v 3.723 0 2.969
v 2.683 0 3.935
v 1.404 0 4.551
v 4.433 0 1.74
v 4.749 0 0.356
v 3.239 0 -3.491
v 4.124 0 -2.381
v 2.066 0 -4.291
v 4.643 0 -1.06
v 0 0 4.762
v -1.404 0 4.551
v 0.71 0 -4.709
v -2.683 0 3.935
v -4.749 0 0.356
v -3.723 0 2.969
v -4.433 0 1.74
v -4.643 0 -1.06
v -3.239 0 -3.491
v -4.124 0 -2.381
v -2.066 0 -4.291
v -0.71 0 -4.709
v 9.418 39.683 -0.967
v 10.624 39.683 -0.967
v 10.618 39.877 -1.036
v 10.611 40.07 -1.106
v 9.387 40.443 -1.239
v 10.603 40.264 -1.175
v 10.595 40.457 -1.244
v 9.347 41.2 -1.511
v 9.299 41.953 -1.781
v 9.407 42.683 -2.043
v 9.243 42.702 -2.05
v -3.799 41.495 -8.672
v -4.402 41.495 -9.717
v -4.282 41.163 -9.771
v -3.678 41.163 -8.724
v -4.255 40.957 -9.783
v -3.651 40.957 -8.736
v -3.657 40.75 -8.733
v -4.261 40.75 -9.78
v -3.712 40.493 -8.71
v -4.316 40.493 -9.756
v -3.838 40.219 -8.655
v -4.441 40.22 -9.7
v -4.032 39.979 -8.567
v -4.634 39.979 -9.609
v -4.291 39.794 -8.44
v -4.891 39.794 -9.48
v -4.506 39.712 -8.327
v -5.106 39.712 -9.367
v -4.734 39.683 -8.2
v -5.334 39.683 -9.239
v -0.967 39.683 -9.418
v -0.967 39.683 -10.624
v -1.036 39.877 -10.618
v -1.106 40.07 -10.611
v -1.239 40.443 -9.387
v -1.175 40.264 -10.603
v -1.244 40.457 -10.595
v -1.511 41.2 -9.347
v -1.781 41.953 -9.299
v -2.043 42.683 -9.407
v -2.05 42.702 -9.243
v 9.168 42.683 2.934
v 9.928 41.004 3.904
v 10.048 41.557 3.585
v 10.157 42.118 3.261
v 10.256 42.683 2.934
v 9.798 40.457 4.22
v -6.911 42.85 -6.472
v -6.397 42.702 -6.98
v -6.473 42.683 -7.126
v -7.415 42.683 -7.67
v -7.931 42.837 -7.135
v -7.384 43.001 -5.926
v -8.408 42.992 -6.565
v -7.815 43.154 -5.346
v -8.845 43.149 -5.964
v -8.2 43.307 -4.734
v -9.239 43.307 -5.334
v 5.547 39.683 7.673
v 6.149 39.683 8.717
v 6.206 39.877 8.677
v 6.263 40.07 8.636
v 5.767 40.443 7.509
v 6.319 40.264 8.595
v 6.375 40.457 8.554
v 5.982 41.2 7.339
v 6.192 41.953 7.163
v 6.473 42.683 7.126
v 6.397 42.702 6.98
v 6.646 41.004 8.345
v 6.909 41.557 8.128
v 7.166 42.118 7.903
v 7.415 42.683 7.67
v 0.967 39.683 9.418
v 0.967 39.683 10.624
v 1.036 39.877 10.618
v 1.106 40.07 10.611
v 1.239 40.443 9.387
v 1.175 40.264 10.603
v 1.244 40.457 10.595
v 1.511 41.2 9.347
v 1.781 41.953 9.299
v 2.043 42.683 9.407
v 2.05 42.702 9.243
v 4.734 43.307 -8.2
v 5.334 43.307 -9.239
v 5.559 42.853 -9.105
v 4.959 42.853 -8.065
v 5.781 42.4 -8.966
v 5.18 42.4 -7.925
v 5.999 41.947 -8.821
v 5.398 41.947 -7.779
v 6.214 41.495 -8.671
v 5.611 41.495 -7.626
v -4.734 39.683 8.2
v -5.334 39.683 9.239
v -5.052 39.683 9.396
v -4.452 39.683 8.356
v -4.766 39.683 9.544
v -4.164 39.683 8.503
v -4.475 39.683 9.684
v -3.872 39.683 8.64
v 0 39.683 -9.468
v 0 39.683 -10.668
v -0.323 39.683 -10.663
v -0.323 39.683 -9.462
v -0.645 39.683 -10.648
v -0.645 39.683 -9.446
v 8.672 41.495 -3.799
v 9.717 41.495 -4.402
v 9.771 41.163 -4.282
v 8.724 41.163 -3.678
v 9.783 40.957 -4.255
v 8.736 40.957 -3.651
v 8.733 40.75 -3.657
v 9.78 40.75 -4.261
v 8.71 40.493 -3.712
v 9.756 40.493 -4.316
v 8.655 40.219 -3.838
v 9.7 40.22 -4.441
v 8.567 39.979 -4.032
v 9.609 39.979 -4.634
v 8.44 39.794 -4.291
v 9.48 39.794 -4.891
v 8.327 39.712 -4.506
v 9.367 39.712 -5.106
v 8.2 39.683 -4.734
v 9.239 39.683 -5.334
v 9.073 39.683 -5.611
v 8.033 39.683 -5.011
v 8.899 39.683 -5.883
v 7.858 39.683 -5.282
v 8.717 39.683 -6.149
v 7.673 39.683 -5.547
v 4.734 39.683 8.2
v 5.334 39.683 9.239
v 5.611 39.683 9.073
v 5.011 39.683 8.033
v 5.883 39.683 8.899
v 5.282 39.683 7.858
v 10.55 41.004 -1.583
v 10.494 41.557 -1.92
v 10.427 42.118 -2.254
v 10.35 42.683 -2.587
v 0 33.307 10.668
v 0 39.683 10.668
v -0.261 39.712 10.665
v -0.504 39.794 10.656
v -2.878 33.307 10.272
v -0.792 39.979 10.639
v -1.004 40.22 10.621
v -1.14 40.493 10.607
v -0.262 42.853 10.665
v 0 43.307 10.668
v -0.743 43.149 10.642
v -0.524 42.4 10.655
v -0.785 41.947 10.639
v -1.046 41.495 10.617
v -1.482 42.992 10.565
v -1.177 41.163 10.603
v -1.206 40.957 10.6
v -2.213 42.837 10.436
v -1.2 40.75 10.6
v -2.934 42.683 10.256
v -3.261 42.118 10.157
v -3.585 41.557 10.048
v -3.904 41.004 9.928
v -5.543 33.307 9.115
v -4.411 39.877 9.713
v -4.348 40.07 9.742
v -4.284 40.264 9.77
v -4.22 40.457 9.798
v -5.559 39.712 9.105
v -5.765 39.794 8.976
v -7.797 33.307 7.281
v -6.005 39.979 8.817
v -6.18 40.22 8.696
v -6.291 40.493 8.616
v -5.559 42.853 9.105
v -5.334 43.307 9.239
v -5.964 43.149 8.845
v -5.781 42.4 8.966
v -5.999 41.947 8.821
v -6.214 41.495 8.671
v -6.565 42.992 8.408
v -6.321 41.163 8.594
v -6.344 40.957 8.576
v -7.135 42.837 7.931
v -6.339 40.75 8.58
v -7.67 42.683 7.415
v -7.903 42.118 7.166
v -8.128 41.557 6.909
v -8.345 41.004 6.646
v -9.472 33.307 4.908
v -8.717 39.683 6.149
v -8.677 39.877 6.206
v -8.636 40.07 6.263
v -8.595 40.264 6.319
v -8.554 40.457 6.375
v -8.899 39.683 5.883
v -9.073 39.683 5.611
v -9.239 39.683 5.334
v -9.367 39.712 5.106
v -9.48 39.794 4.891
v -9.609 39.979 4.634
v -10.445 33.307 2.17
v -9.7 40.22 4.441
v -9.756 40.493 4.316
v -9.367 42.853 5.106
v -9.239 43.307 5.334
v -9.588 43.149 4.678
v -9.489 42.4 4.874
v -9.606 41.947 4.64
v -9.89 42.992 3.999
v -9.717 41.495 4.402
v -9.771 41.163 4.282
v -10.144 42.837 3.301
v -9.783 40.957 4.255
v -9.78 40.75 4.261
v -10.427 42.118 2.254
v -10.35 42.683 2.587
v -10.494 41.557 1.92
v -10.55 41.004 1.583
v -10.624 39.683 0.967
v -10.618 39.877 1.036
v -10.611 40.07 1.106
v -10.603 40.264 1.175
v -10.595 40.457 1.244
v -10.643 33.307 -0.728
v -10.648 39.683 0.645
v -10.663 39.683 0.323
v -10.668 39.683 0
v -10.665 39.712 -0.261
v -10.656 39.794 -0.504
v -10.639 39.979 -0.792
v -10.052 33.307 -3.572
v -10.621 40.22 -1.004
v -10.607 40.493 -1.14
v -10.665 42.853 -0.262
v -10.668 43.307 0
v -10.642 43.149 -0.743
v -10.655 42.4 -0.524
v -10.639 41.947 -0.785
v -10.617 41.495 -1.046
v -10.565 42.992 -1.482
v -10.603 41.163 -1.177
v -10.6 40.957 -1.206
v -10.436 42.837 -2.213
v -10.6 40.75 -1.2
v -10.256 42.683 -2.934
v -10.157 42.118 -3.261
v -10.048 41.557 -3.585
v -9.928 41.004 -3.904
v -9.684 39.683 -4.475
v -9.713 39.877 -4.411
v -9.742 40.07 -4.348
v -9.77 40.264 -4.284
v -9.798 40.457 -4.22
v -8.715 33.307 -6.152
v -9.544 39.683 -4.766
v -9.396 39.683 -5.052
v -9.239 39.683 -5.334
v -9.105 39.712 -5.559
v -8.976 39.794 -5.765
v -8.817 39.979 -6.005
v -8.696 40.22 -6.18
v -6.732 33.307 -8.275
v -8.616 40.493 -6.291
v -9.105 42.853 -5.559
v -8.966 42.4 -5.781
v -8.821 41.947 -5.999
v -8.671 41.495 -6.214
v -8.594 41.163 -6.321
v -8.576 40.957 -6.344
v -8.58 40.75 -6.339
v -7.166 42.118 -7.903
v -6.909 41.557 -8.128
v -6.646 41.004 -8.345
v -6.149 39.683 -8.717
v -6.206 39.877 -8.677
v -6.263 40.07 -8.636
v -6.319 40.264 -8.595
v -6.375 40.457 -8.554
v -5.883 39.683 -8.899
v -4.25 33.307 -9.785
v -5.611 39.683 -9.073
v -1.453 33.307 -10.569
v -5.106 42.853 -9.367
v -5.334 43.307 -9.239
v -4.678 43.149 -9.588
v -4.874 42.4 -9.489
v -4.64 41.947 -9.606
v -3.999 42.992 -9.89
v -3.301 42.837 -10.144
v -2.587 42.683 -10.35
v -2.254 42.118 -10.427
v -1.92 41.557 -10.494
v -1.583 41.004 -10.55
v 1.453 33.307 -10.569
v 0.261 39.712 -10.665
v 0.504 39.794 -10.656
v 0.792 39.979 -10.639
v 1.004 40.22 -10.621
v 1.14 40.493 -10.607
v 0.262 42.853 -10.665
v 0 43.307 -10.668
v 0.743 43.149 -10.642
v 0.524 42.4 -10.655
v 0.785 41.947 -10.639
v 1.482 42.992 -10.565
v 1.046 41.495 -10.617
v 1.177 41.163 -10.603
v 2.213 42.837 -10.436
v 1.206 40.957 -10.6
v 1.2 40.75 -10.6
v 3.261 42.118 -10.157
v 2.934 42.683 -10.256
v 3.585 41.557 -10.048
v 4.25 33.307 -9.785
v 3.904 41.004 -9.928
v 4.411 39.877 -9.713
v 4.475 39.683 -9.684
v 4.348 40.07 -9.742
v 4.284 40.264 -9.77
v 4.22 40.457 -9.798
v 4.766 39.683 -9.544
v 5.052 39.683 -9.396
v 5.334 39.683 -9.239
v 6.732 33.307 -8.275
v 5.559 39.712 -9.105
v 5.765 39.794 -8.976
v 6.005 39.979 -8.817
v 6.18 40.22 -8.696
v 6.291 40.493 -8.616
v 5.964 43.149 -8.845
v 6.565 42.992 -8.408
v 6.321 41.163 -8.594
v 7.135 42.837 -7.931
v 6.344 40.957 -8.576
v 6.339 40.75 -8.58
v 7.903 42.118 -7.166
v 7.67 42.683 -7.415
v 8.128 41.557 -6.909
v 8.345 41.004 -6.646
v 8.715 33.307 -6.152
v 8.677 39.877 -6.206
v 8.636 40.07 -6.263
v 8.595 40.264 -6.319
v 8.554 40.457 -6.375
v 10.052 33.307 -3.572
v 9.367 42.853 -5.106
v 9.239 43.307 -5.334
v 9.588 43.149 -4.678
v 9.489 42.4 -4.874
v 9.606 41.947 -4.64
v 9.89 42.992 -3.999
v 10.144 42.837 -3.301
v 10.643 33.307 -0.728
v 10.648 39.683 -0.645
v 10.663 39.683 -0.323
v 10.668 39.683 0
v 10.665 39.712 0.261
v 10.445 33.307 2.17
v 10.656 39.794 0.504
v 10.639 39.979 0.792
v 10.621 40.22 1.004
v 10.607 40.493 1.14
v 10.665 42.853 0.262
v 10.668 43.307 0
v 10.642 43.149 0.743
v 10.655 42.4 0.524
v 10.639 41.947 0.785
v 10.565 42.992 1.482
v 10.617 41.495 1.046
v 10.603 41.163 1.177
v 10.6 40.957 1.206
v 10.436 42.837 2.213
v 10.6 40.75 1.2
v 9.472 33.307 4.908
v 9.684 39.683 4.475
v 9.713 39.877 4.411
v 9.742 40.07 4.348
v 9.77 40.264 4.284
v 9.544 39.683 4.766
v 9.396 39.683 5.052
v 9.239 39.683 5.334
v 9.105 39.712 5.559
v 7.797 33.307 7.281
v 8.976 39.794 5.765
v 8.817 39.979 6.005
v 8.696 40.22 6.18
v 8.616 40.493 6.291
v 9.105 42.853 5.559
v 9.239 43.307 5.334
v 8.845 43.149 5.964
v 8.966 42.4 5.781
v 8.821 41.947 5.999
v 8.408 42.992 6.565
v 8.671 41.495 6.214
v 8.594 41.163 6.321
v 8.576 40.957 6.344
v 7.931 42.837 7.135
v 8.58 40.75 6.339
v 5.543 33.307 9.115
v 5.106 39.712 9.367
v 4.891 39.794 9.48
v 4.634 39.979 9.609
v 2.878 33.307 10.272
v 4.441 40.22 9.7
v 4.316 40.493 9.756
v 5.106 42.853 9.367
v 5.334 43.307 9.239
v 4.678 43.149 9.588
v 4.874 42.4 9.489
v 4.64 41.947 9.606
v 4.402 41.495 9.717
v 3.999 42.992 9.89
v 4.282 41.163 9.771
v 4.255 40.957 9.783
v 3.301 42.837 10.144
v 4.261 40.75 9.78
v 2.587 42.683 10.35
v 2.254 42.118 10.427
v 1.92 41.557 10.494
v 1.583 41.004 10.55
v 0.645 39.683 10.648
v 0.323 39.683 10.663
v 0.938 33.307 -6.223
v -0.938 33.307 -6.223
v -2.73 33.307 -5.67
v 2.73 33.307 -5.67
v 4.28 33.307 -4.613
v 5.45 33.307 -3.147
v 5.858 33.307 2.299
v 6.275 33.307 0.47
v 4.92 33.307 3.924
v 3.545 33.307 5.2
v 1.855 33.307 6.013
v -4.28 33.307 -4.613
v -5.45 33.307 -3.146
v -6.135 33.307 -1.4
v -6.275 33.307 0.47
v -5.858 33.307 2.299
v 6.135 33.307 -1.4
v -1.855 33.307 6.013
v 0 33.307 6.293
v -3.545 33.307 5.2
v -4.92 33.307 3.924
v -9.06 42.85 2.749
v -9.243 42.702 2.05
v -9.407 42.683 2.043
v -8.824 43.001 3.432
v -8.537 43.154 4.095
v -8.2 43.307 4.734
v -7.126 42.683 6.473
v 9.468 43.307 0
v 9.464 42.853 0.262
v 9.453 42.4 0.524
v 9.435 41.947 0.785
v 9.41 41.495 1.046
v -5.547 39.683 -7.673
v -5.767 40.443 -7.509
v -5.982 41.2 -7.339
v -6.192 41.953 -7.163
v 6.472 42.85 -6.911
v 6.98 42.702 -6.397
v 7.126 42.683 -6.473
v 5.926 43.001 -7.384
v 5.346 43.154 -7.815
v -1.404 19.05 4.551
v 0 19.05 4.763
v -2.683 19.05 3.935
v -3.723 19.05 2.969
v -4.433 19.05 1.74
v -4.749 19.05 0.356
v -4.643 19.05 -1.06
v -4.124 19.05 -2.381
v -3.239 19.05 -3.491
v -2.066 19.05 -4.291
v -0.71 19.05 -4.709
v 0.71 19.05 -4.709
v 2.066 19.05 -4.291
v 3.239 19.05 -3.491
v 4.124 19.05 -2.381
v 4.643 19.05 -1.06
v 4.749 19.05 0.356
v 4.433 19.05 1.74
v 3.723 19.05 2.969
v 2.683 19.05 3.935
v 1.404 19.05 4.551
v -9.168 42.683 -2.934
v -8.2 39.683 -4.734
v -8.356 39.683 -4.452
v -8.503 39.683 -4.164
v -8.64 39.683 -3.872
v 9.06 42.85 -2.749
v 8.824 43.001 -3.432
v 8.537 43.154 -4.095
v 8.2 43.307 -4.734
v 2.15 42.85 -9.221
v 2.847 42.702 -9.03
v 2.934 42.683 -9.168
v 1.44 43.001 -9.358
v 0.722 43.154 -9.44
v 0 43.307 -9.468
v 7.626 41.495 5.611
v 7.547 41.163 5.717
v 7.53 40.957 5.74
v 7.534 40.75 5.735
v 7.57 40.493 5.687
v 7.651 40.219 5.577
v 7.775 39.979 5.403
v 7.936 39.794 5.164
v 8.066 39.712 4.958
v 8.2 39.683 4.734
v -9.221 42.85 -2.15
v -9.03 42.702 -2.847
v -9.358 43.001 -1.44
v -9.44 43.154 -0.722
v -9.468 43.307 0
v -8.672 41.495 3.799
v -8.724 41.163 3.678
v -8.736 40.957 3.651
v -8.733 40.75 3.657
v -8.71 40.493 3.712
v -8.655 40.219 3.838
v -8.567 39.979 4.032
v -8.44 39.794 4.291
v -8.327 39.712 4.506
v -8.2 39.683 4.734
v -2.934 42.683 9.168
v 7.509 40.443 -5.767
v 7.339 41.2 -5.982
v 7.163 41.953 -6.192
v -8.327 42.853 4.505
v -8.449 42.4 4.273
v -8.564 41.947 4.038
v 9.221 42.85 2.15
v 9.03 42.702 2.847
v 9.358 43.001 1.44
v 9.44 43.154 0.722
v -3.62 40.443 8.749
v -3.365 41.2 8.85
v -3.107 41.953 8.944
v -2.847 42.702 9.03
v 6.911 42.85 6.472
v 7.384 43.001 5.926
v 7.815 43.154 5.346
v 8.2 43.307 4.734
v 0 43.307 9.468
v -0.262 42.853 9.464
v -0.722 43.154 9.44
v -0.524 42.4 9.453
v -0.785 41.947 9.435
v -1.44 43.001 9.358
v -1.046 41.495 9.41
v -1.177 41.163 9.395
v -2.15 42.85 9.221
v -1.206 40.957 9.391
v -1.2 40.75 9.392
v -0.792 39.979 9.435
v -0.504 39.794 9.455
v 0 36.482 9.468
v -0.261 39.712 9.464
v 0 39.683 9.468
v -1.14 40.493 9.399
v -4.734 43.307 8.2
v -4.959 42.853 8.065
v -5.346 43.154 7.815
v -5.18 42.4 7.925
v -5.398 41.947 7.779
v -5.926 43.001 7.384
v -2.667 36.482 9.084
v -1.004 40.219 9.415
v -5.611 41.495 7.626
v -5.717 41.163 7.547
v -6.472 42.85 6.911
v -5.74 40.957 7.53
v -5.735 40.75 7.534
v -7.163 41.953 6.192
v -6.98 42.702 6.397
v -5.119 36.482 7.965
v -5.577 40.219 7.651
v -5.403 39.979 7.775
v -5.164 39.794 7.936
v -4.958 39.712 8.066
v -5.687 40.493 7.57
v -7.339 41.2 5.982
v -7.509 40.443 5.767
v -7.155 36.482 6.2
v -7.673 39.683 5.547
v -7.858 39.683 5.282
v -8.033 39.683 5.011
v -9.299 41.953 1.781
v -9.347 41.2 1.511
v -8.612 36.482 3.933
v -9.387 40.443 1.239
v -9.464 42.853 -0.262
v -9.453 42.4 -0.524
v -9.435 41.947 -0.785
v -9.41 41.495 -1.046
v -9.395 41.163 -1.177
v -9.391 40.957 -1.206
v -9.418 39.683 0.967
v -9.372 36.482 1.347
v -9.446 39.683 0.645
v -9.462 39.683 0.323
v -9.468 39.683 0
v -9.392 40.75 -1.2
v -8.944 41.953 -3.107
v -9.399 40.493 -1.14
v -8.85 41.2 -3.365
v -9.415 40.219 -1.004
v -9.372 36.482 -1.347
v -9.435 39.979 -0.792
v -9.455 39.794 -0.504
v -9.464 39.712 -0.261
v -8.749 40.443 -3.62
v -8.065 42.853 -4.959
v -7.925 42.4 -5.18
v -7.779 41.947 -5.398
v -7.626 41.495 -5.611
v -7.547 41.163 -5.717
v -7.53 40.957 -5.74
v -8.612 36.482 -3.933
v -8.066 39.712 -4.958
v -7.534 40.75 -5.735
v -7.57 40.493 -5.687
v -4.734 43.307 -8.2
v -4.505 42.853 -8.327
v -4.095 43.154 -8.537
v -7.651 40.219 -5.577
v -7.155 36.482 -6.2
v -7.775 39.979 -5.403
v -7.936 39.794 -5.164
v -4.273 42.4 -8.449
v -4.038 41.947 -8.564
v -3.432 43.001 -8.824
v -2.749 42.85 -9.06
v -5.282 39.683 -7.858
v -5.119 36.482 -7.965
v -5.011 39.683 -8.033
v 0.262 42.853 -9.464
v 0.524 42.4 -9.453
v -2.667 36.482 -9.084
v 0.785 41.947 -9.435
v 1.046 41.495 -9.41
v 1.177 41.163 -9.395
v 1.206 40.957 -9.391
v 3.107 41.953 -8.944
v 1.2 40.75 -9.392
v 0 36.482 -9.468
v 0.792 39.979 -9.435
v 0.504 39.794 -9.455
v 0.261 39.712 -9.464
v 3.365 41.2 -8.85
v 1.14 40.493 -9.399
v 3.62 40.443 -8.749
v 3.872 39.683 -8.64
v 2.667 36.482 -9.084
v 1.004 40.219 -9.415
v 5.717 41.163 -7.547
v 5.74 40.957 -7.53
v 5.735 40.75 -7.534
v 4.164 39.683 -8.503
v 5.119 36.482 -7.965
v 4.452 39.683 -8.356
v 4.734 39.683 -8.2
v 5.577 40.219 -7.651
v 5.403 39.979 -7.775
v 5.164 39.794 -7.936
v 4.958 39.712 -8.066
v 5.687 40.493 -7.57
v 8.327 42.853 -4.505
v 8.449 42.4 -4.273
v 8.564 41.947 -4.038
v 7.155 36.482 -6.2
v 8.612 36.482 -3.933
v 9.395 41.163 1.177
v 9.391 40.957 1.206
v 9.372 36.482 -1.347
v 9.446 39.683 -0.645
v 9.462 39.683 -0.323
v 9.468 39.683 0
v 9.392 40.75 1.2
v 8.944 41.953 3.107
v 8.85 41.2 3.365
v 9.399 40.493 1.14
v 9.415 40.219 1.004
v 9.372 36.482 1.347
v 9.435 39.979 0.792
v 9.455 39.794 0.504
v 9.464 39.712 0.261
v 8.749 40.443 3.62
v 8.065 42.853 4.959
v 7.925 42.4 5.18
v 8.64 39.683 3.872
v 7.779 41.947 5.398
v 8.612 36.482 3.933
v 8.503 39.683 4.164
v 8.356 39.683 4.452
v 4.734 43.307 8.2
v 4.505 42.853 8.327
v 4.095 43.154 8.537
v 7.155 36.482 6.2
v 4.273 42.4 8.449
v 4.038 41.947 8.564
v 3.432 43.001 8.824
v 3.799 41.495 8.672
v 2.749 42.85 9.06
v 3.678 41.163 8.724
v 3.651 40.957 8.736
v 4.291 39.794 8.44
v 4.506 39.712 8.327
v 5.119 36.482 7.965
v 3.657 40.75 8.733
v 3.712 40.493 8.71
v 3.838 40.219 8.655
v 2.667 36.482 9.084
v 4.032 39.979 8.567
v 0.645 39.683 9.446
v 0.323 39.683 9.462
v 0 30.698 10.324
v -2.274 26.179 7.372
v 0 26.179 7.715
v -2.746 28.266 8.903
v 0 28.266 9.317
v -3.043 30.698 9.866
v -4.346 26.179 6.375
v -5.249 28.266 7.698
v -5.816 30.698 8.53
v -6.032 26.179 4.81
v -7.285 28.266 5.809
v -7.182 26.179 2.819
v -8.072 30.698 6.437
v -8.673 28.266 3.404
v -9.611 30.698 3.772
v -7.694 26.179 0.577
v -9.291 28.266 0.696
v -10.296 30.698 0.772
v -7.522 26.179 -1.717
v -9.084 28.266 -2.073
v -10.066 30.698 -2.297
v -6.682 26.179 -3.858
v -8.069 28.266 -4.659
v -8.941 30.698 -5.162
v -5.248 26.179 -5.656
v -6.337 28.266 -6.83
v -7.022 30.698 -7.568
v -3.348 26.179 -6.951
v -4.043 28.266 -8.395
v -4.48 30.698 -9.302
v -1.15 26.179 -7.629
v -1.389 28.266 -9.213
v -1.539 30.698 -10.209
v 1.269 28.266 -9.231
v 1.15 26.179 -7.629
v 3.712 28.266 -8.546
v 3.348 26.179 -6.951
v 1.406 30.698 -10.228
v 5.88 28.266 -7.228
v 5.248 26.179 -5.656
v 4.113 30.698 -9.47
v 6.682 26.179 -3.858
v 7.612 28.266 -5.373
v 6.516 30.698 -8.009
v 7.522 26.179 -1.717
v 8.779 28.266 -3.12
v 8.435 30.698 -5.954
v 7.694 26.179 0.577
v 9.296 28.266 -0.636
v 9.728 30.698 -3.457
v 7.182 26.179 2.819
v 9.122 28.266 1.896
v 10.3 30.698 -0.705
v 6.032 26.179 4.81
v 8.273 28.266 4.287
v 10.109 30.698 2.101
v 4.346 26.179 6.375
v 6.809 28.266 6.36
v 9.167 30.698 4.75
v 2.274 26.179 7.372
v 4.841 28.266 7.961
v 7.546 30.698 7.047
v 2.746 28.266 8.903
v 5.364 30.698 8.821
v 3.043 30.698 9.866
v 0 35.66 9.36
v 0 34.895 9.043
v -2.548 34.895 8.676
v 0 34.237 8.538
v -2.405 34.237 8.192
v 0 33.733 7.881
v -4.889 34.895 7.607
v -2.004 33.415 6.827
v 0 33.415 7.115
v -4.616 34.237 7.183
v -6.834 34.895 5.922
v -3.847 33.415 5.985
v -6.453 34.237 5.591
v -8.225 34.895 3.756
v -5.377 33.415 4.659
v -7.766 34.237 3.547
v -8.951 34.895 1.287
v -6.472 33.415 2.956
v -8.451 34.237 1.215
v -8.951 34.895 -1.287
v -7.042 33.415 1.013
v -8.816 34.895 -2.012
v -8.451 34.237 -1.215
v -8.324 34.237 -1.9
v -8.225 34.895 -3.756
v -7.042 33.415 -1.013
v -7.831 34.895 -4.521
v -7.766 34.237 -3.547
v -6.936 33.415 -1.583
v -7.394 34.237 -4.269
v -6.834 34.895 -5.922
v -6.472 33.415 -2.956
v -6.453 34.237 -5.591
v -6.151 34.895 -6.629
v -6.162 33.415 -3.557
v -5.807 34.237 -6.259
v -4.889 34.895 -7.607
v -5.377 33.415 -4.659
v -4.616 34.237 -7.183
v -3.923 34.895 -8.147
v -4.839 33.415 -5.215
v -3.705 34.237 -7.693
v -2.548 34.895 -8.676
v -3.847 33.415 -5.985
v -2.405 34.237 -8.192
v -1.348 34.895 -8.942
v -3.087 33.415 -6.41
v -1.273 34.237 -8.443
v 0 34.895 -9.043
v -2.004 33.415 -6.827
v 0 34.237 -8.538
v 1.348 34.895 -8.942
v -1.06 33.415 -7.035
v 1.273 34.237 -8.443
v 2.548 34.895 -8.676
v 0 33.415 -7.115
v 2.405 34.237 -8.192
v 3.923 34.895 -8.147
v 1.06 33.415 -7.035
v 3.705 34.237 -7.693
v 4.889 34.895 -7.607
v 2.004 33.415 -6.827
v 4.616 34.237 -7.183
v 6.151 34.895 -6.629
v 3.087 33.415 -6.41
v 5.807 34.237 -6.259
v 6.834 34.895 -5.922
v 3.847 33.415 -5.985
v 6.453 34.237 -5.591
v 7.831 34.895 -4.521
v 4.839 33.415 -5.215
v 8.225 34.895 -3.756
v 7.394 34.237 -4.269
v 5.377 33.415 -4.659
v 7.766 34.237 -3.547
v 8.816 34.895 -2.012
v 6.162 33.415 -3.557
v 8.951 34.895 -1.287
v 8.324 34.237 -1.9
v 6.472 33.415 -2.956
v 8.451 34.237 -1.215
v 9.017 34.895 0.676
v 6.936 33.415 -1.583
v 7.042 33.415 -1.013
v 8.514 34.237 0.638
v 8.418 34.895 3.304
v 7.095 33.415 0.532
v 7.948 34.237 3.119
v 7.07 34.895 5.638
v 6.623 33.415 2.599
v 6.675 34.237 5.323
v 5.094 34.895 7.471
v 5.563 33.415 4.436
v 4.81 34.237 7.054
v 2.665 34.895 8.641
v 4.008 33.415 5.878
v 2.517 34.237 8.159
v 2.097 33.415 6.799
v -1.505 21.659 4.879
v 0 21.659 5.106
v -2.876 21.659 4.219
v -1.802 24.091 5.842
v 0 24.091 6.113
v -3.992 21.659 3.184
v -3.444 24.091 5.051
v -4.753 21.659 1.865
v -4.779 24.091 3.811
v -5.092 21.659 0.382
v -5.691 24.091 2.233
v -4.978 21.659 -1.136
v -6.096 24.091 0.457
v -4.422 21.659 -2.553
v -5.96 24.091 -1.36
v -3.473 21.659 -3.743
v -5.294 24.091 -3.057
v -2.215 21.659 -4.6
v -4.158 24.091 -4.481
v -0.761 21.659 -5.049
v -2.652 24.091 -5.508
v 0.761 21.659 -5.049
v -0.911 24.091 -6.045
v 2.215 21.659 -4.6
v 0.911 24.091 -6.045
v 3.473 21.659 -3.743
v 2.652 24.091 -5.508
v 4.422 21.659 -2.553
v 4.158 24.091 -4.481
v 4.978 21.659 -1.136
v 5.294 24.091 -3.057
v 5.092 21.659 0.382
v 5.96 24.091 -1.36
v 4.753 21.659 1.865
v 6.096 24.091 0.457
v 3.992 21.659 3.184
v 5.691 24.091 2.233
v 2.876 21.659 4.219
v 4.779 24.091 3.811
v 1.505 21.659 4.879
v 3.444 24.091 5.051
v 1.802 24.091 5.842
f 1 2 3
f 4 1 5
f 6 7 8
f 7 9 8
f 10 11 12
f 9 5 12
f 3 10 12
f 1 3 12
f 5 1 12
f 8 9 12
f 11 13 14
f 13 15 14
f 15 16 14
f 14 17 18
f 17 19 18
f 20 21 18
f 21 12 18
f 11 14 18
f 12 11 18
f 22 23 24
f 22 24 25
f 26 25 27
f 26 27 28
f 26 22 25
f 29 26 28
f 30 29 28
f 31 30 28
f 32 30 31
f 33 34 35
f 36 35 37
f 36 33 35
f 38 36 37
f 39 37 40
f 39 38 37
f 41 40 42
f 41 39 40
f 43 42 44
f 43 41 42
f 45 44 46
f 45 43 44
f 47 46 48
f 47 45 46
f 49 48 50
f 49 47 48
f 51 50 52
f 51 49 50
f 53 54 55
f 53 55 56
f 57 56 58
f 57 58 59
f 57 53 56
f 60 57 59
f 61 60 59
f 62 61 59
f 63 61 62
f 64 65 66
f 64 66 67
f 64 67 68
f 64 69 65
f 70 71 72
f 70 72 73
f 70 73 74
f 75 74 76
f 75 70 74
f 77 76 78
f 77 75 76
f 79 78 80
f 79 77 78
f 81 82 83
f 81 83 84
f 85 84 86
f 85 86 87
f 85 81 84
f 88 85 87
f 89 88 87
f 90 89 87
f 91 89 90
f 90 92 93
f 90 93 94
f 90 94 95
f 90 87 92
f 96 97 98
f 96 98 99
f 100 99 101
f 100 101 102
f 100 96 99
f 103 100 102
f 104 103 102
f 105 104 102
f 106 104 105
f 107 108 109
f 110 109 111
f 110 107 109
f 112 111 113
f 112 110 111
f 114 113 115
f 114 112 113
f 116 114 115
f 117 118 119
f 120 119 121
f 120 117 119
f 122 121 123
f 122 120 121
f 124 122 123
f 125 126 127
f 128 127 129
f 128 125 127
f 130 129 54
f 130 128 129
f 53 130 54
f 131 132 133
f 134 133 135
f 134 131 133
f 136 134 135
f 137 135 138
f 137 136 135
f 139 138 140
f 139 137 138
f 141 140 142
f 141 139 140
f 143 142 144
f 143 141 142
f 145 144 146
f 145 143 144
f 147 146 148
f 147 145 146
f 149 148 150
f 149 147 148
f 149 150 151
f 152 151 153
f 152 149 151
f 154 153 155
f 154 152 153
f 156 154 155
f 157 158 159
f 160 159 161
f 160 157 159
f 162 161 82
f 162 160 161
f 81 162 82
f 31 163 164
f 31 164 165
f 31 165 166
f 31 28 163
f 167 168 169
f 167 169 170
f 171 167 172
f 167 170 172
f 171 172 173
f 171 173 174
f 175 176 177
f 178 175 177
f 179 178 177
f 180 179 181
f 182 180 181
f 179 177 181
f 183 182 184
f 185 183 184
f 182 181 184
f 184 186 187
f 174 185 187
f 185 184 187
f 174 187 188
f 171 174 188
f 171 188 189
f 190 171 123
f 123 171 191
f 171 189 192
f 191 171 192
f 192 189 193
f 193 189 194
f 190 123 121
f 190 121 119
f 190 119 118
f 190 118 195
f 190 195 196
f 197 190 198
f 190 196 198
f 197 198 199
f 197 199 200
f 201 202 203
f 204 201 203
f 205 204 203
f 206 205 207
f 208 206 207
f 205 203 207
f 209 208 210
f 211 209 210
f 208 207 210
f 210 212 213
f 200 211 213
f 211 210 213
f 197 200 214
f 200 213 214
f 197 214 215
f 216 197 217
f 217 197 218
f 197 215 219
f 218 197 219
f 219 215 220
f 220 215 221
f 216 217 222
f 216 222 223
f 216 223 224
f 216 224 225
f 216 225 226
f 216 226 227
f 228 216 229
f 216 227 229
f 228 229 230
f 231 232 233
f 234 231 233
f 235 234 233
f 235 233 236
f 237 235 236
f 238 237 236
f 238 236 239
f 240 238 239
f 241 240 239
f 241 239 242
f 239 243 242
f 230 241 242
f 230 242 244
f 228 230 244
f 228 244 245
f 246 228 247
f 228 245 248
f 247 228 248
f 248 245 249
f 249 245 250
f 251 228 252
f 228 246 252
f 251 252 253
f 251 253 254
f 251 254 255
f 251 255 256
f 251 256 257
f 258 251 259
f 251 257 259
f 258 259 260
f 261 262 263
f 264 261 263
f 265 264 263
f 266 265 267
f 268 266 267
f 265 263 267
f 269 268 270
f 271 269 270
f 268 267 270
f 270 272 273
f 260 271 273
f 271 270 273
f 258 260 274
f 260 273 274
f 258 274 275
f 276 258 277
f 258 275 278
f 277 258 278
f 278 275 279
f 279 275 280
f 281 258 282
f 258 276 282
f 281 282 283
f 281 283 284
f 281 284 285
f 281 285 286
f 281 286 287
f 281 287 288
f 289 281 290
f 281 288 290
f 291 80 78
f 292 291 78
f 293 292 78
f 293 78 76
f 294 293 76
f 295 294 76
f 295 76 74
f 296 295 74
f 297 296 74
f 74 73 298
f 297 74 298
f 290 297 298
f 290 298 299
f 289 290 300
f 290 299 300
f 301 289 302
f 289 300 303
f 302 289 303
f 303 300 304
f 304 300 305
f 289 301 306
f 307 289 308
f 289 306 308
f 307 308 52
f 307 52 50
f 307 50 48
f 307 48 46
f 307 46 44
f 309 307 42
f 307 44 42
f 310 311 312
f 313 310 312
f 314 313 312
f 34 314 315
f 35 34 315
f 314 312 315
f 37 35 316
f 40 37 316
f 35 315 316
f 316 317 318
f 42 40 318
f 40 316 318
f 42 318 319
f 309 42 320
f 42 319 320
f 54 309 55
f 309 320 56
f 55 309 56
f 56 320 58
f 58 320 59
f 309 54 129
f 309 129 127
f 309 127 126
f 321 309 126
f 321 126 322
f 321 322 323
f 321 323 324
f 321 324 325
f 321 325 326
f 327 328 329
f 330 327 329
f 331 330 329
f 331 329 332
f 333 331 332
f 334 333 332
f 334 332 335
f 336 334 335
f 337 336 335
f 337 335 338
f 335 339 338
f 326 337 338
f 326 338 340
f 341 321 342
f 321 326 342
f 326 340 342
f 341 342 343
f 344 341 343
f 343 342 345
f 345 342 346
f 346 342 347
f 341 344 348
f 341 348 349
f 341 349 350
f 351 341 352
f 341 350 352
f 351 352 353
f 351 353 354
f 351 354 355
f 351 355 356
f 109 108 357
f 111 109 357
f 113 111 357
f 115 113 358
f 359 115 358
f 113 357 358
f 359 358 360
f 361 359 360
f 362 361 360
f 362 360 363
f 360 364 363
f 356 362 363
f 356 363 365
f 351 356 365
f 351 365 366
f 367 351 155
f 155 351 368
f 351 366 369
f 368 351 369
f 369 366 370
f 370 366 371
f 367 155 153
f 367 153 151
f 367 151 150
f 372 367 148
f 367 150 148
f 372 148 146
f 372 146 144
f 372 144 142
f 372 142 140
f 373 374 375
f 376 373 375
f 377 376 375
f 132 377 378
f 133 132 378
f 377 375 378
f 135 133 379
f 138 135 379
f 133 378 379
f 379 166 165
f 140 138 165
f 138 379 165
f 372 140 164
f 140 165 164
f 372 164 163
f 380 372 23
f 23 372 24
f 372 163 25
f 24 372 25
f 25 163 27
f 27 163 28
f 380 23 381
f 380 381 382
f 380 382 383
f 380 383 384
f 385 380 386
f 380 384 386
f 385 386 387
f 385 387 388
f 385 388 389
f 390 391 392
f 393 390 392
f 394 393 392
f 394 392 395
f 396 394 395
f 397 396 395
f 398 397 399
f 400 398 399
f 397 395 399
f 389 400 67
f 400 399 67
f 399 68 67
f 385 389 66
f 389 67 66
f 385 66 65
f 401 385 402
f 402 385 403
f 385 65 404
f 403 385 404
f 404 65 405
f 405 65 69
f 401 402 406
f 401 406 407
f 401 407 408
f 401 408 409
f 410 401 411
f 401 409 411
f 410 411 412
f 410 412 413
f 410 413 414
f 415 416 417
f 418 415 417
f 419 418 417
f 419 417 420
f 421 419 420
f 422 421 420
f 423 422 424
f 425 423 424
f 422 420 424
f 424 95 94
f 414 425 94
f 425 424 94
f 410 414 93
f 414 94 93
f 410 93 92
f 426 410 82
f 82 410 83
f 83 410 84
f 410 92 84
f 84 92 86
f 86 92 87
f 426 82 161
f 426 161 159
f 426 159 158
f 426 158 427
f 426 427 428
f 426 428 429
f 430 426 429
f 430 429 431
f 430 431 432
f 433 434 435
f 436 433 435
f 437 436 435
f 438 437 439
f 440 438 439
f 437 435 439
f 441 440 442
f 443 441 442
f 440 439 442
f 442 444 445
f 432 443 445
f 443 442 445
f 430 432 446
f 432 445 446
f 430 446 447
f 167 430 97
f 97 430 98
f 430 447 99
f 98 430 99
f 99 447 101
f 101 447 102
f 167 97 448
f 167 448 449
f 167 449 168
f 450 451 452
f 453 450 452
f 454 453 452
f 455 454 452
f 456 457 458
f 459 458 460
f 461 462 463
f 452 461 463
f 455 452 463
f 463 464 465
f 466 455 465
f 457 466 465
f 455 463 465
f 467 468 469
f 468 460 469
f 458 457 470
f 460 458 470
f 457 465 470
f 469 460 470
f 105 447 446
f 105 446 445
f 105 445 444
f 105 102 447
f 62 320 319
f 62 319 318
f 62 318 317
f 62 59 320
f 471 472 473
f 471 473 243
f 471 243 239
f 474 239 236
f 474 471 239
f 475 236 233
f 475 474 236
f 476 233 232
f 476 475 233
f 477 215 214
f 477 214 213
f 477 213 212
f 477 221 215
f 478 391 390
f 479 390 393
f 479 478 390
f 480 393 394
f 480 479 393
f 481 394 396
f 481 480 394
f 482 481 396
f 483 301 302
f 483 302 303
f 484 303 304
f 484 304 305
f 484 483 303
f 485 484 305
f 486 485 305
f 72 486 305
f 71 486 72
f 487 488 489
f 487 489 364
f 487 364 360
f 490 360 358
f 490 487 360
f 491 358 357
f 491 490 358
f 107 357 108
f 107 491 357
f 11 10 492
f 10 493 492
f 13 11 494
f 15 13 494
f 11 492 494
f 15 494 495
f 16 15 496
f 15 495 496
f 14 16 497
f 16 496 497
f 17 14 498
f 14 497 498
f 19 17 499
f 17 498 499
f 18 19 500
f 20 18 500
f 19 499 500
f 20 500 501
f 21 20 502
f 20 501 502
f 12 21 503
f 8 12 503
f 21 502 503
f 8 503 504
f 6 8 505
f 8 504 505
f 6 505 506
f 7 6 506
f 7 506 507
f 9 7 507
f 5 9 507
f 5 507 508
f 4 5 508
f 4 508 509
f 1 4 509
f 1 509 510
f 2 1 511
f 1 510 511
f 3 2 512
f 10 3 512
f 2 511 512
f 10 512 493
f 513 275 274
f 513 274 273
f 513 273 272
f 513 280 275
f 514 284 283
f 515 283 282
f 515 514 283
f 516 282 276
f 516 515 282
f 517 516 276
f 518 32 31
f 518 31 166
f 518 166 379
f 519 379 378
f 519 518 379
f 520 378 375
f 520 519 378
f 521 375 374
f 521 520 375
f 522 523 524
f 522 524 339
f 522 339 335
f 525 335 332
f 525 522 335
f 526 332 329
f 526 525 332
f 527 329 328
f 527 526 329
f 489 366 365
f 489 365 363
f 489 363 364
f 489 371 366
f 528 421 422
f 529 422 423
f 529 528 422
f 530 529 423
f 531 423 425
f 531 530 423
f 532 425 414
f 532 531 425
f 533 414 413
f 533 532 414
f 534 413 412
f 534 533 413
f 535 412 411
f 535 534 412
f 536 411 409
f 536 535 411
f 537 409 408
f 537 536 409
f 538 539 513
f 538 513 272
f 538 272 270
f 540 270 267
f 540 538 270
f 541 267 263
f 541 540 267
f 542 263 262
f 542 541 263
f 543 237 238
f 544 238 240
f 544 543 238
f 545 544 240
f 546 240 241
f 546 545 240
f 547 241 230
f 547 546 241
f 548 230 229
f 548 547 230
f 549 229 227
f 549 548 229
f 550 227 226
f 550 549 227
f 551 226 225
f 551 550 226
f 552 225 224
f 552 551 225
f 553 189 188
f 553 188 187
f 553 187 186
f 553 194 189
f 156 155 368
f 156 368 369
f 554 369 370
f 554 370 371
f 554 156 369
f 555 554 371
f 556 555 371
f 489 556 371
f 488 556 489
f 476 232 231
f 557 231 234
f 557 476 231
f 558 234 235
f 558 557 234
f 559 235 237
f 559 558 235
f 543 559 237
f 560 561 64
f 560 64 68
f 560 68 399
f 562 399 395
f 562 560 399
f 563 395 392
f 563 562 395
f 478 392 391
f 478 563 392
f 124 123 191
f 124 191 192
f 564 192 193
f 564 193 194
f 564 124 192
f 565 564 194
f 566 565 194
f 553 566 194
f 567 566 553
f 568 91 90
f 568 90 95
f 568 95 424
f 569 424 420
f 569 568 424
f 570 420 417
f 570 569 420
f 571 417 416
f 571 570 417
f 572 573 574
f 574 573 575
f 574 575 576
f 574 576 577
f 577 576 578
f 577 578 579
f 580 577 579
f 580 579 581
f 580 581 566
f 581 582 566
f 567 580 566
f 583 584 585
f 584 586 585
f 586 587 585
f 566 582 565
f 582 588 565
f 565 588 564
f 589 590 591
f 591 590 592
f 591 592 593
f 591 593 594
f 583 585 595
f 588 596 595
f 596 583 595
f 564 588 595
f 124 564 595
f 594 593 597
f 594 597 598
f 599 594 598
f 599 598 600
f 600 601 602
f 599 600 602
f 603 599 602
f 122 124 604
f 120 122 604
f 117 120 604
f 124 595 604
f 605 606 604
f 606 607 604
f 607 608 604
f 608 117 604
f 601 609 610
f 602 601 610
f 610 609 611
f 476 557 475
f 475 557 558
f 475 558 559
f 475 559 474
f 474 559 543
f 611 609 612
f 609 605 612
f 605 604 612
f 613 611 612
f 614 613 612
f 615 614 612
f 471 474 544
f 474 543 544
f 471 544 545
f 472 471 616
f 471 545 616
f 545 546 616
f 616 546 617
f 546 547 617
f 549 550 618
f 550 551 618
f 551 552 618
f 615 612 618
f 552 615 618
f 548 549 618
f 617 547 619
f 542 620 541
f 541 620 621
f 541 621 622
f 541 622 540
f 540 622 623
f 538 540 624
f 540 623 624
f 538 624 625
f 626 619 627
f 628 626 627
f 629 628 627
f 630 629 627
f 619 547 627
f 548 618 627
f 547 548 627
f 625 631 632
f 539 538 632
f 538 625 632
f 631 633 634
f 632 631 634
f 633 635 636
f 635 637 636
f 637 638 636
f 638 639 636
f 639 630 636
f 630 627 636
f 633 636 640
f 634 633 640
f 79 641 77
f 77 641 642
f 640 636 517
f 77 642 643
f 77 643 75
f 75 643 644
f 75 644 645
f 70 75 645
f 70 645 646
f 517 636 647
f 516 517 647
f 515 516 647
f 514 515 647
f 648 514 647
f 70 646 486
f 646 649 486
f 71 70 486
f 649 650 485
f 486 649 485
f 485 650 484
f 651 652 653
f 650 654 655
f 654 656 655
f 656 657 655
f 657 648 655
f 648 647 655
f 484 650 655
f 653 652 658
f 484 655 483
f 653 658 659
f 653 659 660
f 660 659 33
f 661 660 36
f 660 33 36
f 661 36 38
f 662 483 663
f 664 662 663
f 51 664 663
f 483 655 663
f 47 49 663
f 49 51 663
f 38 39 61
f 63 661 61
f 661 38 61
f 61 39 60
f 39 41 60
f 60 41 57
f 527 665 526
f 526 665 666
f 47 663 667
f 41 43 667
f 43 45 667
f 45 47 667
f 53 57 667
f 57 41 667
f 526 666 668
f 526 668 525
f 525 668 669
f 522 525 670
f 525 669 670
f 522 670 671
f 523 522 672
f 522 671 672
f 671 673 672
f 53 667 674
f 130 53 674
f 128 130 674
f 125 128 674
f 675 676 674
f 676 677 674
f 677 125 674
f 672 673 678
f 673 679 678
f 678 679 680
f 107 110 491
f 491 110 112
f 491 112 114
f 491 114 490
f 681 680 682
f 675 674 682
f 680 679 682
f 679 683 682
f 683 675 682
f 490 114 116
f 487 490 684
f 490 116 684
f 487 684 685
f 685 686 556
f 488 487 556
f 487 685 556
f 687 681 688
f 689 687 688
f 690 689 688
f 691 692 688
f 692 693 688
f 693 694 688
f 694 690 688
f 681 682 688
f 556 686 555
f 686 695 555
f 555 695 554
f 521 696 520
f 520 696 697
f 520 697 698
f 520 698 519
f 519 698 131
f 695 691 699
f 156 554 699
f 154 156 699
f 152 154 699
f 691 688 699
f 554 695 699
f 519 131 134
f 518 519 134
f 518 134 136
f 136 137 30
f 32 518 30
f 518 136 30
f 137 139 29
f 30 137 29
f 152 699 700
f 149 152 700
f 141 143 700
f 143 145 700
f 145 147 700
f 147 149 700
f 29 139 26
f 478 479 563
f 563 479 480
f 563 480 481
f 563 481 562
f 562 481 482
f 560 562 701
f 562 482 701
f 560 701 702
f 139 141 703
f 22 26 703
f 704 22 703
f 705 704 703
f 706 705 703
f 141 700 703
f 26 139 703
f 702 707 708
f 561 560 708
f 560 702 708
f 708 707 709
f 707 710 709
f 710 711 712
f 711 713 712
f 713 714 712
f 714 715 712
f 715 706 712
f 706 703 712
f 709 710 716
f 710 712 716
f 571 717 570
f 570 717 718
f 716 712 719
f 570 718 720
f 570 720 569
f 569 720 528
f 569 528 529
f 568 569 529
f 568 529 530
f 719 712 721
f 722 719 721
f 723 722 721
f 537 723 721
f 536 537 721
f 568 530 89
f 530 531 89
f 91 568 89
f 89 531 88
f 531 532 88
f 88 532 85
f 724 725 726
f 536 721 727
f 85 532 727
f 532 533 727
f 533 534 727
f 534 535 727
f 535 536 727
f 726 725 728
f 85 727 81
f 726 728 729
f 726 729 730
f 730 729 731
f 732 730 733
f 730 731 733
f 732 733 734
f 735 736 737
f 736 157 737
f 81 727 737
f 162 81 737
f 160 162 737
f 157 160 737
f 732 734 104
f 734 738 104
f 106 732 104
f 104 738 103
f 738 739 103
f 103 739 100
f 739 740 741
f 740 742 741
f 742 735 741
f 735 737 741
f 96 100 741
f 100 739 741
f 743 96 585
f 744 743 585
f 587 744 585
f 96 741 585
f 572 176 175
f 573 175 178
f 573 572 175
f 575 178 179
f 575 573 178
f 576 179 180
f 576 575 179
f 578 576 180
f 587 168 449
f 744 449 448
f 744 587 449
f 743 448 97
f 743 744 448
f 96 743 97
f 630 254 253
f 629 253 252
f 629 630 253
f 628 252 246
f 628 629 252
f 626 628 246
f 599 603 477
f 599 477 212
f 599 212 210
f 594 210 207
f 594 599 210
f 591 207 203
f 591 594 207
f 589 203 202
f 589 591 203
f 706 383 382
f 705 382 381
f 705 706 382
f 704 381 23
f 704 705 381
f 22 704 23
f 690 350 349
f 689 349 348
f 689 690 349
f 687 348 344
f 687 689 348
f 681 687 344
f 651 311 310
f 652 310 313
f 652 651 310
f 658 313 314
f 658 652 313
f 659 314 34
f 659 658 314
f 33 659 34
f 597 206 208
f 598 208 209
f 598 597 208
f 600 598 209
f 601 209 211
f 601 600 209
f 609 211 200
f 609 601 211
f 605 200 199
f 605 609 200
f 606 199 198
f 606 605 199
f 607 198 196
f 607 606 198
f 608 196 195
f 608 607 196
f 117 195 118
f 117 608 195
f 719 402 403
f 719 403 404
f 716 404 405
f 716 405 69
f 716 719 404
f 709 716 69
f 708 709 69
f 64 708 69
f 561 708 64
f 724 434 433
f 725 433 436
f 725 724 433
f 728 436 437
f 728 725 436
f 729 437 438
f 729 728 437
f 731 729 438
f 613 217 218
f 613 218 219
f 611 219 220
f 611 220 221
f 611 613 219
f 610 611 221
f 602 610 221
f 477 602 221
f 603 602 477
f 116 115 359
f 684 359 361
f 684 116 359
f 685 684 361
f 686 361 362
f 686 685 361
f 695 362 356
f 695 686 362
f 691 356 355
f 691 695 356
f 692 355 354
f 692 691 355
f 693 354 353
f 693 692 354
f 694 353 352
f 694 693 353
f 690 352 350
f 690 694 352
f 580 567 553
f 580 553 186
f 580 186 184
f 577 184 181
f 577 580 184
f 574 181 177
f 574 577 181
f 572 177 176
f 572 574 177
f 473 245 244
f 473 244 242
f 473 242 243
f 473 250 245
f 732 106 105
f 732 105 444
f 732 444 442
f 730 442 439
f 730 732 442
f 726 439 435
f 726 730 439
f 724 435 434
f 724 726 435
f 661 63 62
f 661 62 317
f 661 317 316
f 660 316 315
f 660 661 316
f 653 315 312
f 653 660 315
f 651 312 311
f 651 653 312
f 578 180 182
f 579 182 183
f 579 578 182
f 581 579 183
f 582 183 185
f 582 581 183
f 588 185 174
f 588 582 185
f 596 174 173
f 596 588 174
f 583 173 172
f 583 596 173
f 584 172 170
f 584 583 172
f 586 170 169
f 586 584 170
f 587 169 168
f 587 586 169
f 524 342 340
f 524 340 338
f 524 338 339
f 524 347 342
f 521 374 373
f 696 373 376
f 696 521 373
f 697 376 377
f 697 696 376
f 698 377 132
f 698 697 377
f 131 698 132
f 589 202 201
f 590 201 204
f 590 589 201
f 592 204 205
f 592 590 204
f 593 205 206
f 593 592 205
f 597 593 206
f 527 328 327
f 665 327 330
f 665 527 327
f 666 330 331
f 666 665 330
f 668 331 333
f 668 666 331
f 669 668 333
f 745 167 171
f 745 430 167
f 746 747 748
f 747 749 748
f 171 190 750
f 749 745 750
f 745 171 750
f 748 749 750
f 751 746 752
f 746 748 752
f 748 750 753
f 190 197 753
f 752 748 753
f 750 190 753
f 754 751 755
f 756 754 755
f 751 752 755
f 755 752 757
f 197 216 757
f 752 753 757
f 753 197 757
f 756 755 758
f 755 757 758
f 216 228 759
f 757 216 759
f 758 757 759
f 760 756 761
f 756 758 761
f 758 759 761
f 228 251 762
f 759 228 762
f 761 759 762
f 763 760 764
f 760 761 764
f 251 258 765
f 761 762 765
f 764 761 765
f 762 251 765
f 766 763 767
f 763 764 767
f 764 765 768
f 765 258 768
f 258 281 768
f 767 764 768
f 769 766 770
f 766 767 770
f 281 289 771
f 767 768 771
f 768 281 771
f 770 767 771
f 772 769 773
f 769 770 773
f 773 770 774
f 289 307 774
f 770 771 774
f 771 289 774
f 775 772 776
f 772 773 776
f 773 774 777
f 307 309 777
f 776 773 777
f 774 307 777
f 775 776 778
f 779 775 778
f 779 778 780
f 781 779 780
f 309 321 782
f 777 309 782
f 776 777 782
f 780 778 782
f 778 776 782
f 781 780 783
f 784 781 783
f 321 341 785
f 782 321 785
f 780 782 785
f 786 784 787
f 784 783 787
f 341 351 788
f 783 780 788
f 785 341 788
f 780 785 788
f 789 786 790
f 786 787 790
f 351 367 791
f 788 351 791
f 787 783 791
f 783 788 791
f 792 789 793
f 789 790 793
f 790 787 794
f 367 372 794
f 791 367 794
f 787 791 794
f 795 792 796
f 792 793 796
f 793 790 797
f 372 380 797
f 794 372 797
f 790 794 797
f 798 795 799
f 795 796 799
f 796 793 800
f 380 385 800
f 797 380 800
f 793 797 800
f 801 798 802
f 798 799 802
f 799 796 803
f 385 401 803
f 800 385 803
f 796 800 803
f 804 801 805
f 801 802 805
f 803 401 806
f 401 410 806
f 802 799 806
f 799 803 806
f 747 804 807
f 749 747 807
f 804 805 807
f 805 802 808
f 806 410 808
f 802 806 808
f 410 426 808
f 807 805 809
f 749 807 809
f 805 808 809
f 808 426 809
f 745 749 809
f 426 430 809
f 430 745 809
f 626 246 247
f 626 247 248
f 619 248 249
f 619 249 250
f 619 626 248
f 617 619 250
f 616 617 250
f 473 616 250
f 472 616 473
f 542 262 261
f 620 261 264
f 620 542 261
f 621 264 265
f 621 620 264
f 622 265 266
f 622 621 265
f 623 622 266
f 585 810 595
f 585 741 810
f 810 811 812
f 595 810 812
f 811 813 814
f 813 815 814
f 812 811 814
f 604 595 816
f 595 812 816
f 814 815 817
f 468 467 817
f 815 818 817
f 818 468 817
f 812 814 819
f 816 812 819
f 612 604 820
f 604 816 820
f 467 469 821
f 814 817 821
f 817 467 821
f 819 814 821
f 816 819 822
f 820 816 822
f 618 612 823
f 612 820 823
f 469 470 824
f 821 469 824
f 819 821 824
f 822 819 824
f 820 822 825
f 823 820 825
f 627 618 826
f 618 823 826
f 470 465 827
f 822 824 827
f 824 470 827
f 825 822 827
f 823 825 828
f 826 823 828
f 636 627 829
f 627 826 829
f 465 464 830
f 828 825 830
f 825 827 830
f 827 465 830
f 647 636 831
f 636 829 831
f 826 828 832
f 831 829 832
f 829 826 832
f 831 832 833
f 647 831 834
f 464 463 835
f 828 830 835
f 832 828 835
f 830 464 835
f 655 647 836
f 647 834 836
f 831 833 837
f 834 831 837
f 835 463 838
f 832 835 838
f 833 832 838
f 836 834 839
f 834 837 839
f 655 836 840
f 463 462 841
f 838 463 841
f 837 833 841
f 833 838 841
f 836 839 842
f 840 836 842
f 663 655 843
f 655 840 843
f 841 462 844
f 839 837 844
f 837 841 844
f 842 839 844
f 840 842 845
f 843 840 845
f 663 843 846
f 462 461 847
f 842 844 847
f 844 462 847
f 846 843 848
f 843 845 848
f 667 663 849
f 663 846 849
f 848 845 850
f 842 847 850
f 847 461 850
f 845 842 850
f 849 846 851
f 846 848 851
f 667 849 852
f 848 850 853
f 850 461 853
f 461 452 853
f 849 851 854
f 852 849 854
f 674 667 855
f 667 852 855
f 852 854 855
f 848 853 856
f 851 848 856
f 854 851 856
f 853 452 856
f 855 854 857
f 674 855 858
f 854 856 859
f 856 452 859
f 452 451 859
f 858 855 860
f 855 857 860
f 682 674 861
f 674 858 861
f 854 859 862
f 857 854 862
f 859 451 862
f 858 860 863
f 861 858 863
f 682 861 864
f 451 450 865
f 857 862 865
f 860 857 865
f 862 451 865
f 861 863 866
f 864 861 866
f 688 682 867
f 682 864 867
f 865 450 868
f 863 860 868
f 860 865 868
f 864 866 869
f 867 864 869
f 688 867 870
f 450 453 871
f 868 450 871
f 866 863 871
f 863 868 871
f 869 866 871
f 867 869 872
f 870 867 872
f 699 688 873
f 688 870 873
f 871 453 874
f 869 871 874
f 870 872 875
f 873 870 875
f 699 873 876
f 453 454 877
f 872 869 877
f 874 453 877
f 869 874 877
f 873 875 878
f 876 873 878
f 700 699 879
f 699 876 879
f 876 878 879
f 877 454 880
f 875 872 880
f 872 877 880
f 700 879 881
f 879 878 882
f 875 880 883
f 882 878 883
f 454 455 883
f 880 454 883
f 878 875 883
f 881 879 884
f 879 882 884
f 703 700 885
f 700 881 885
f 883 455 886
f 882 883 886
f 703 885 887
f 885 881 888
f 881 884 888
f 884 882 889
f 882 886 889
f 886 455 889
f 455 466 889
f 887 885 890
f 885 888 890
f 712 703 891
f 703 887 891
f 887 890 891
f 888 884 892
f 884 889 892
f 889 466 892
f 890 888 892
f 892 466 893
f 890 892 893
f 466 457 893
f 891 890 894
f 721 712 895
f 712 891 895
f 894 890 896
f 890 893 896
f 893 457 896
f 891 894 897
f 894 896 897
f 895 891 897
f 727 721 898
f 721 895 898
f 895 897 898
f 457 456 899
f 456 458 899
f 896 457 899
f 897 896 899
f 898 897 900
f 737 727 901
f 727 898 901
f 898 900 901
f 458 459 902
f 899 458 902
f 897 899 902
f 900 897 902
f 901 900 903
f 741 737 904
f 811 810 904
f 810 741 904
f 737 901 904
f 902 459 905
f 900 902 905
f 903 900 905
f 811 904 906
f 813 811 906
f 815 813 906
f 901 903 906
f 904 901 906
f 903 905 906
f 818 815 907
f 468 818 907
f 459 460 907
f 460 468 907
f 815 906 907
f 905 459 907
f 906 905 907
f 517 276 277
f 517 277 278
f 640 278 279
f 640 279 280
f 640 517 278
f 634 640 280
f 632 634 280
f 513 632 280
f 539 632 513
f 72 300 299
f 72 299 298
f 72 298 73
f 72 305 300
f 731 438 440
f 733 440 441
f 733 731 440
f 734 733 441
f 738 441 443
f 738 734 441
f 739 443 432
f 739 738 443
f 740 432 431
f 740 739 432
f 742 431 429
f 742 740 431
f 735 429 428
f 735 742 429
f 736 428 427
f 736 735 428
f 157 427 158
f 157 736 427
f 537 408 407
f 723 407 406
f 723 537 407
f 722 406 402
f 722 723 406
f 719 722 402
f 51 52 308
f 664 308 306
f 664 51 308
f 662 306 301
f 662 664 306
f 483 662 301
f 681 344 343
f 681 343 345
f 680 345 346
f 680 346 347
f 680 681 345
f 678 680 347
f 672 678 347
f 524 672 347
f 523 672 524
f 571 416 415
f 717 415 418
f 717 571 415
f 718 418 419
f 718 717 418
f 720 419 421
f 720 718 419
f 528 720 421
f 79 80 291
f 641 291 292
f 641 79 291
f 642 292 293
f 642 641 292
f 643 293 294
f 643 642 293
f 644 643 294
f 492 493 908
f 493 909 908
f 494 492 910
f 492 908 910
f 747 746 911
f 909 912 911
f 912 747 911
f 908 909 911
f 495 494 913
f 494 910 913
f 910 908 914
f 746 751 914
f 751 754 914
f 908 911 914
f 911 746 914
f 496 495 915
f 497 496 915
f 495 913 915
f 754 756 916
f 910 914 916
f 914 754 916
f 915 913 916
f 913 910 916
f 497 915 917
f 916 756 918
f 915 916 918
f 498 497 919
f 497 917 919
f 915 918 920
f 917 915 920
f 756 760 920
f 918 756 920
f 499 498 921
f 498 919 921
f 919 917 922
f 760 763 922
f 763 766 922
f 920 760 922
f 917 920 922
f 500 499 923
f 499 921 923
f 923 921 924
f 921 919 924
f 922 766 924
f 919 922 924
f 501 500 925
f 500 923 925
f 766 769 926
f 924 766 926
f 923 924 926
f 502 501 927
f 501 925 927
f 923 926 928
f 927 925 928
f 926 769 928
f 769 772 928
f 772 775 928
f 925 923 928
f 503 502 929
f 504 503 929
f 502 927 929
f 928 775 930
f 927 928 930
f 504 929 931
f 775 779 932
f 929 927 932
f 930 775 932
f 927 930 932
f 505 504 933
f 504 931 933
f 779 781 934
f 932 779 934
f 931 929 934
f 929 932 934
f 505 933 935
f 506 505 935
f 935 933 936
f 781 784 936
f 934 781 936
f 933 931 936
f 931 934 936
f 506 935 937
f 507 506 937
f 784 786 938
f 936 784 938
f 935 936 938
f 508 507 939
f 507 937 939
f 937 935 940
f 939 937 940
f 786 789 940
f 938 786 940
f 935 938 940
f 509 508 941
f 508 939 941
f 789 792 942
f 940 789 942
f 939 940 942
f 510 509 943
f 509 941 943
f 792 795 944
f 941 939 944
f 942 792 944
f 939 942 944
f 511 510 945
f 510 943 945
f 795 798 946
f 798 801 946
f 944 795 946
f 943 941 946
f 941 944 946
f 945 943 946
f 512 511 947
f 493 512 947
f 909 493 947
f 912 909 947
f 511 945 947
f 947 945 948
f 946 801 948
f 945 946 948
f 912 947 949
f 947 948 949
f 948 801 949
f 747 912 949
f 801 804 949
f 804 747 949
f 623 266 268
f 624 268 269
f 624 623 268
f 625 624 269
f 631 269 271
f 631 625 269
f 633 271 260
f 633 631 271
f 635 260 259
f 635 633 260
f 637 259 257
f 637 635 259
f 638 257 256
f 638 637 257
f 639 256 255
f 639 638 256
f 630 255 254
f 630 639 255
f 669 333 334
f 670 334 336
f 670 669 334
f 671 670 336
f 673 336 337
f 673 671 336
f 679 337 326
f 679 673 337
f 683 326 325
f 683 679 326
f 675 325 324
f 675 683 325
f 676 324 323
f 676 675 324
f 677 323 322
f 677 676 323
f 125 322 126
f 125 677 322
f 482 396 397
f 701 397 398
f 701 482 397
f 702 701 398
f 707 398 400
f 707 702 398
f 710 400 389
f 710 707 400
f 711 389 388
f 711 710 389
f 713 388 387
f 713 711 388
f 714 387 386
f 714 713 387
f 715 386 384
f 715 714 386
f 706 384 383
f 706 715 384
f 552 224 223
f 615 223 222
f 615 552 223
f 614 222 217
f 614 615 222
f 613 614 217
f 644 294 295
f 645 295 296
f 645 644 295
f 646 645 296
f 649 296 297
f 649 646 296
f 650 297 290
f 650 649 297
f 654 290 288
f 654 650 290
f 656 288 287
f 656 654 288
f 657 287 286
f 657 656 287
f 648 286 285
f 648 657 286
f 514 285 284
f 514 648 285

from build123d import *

# Parameters (mm, degrees)
CUT_EXTRUDE1_DEPTH = 19.304
CIRPATTERN2_COUNT  = 12


with BuildPart() as part:
    # Sketch1 → Revolve1 (revolve)
    with BuildSketch(Plane.XY):
        with BuildLine():
            Line((0, 0), (-4.7625, 0))
            Line((-4.7625, 0), (-4.7625, 19.05))
            ThreePointArc((-4.7625, 19.05), (-5.529894723, 22.907953795), (-7.71525, 26.178569096))
            ThreePointArc((-7.71525, 26.178569096), (-9.900605277, 29.449184398), (-10.668, 33.307138193))
            Line((-10.668, 33.307138193), (-10.668, 43.307138193))
            Line((-10.668, 43.307138193), (-9.468, 43.307138193))
            Line((-9.468, 43.307138193), (-9.468, 36.482138193))
            ThreePointArc((-9.468, 36.482138193), (-8.53806403, 34.237074162), (-6.293, 33.307138193))
            Line((-6.293, 33.307138193), (0, 33.307138193))
            Line((0, 33.307138193), (0, 0))
        make_face()
    revolve(axis=Axis((0, 33.307138193, 0), (0, -1, 0)))

    # Sketch2 → Cut-Extrude1 (cut)
    with BuildSketch(Plane.XY):
        with BuildLine():
            Line((0, 43.307138193), (1.04608221, 41.495270656))
            ThreePointArc((1.04608221, 41.495270656), (1.04608221, 40.287358966), (0, 39.68340312))
            Line((0, 39.68340312), (-0.966946132, 39.68340312))
            Line((-0.966946132, 39.68340312), (-2.440808814, 43.792749848))
            Line((-2.440808814, 43.792749848), (4.66649361, 43.792749848))
            Line((4.66649361, 43.792749848), (4.66649361, 39.68340312))
            Line((4.66649361, 39.68340312), (2.934442802, 42.68340312))
            Line((2.934442802, 42.68340312), (0, 43.307138193))
        make_face()
    cut_extrude1 = extrude(amount=-CUT_EXTRUDE1_DEPTH, mode=Mode.SUBTRACT)

    # CirPattern2: Cut-Extrude1 ×12 about axis
    cirpattern2_axis = Axis((0, 36.482138193, 0), (0, 1, 0))
    for i in range(1, CIRPATTERN2_COUNT):
        add(cut_extrude1.rotate(cirpattern2_axis, i * 360 / CIRPATTERN2_COUNT), mode=Mode.SUBTRACT)


solid = part.part
